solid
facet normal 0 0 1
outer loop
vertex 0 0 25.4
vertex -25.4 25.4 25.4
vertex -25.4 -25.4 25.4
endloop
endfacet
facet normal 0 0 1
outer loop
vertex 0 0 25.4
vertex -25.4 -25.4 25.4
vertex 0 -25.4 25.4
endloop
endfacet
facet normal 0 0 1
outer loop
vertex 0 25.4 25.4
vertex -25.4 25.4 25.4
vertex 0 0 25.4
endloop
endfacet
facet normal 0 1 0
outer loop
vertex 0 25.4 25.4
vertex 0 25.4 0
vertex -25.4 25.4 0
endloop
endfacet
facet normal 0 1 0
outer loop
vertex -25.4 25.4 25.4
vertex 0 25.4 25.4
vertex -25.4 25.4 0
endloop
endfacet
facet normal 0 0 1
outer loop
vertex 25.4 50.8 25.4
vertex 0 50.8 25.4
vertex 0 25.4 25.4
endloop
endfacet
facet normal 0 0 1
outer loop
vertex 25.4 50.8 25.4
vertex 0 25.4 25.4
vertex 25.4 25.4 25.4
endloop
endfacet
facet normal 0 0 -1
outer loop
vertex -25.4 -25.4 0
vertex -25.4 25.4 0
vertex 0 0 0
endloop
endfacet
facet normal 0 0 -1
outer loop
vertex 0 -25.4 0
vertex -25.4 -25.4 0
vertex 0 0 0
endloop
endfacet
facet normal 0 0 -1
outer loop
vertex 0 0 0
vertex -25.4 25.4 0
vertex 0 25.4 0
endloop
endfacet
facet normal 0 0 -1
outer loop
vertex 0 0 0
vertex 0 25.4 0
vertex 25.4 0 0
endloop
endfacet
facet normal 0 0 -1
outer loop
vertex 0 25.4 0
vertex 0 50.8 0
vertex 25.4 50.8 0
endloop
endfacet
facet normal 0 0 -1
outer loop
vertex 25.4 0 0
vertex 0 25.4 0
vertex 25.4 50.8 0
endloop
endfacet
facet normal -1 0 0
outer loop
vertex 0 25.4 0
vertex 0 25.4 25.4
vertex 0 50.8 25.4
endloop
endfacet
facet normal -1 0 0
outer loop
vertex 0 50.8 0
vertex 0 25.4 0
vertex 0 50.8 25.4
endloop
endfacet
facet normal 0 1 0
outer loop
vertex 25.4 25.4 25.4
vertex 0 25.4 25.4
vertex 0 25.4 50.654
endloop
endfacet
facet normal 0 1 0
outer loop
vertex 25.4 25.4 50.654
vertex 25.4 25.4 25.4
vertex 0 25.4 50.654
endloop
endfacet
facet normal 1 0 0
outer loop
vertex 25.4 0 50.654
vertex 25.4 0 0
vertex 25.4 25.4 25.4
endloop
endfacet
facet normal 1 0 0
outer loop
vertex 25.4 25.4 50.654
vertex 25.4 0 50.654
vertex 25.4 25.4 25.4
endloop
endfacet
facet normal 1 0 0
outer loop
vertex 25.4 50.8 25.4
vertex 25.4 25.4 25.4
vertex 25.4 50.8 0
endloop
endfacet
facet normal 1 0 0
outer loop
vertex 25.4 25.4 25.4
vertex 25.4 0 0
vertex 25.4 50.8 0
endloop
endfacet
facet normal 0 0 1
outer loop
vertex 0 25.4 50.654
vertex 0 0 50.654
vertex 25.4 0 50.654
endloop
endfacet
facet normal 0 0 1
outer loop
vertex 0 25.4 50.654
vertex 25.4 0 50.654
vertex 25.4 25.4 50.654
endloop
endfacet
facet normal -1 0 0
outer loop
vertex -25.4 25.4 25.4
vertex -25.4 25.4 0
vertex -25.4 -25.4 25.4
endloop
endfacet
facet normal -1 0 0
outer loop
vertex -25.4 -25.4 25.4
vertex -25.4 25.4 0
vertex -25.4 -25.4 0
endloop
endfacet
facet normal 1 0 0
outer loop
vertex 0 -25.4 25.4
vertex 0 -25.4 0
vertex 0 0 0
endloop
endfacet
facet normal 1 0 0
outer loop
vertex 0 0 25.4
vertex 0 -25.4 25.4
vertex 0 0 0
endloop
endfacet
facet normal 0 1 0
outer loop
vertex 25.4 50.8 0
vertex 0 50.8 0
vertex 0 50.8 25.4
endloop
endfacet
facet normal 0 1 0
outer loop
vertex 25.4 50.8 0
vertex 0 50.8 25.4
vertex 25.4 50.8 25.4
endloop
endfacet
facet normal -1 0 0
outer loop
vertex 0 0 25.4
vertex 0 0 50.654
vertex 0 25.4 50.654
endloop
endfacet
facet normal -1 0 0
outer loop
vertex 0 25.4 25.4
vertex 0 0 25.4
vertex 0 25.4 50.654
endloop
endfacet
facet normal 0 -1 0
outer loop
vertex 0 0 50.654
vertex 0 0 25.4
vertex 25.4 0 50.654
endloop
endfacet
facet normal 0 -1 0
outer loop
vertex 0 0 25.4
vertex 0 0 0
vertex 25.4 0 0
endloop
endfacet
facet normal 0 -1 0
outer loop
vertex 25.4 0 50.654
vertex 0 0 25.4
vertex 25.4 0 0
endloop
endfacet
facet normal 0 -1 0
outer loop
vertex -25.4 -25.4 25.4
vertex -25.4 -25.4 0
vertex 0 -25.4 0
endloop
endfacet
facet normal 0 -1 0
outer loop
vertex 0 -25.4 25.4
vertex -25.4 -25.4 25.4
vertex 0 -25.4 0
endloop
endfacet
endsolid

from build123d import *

# Parameters (mm, degrees)
F0_W     = 25.400002
F0_H     = 25.4
F0_W_2   = 25.4
F1_DEPTH = 25.4
F2_W     = 25.4
F2_H     = 25.4
F3_DEPTH = 25.4


with BuildPart() as f1:
    # F0 (on Top) → F1 (new body)
    with BuildSketch(Plane.XY):
        with Locations((-12.700001, -12.7)):
            Rectangle(F0_W, F0_H)
        with Locations((12.7, 12.7)):
            Rectangle(F0_W_2, F0_H)
        with Locations((-12.700001, 12.7)):
            Rectangle(F0_W, F0_H)
        with Locations((12.7, 38.1)):
            Rectangle(F0_W_2, F0_H)
    extrude(amount=F1_DEPTH)

    # F2 (on Right) → F3 (join)
    with BuildSketch(Plane.YZ):
        with Locations((12.7, 37.954024)):
            Rectangle(F2_W, F2_H)
    extrude(amount=F3_DEPTH)


solid = f1.part
